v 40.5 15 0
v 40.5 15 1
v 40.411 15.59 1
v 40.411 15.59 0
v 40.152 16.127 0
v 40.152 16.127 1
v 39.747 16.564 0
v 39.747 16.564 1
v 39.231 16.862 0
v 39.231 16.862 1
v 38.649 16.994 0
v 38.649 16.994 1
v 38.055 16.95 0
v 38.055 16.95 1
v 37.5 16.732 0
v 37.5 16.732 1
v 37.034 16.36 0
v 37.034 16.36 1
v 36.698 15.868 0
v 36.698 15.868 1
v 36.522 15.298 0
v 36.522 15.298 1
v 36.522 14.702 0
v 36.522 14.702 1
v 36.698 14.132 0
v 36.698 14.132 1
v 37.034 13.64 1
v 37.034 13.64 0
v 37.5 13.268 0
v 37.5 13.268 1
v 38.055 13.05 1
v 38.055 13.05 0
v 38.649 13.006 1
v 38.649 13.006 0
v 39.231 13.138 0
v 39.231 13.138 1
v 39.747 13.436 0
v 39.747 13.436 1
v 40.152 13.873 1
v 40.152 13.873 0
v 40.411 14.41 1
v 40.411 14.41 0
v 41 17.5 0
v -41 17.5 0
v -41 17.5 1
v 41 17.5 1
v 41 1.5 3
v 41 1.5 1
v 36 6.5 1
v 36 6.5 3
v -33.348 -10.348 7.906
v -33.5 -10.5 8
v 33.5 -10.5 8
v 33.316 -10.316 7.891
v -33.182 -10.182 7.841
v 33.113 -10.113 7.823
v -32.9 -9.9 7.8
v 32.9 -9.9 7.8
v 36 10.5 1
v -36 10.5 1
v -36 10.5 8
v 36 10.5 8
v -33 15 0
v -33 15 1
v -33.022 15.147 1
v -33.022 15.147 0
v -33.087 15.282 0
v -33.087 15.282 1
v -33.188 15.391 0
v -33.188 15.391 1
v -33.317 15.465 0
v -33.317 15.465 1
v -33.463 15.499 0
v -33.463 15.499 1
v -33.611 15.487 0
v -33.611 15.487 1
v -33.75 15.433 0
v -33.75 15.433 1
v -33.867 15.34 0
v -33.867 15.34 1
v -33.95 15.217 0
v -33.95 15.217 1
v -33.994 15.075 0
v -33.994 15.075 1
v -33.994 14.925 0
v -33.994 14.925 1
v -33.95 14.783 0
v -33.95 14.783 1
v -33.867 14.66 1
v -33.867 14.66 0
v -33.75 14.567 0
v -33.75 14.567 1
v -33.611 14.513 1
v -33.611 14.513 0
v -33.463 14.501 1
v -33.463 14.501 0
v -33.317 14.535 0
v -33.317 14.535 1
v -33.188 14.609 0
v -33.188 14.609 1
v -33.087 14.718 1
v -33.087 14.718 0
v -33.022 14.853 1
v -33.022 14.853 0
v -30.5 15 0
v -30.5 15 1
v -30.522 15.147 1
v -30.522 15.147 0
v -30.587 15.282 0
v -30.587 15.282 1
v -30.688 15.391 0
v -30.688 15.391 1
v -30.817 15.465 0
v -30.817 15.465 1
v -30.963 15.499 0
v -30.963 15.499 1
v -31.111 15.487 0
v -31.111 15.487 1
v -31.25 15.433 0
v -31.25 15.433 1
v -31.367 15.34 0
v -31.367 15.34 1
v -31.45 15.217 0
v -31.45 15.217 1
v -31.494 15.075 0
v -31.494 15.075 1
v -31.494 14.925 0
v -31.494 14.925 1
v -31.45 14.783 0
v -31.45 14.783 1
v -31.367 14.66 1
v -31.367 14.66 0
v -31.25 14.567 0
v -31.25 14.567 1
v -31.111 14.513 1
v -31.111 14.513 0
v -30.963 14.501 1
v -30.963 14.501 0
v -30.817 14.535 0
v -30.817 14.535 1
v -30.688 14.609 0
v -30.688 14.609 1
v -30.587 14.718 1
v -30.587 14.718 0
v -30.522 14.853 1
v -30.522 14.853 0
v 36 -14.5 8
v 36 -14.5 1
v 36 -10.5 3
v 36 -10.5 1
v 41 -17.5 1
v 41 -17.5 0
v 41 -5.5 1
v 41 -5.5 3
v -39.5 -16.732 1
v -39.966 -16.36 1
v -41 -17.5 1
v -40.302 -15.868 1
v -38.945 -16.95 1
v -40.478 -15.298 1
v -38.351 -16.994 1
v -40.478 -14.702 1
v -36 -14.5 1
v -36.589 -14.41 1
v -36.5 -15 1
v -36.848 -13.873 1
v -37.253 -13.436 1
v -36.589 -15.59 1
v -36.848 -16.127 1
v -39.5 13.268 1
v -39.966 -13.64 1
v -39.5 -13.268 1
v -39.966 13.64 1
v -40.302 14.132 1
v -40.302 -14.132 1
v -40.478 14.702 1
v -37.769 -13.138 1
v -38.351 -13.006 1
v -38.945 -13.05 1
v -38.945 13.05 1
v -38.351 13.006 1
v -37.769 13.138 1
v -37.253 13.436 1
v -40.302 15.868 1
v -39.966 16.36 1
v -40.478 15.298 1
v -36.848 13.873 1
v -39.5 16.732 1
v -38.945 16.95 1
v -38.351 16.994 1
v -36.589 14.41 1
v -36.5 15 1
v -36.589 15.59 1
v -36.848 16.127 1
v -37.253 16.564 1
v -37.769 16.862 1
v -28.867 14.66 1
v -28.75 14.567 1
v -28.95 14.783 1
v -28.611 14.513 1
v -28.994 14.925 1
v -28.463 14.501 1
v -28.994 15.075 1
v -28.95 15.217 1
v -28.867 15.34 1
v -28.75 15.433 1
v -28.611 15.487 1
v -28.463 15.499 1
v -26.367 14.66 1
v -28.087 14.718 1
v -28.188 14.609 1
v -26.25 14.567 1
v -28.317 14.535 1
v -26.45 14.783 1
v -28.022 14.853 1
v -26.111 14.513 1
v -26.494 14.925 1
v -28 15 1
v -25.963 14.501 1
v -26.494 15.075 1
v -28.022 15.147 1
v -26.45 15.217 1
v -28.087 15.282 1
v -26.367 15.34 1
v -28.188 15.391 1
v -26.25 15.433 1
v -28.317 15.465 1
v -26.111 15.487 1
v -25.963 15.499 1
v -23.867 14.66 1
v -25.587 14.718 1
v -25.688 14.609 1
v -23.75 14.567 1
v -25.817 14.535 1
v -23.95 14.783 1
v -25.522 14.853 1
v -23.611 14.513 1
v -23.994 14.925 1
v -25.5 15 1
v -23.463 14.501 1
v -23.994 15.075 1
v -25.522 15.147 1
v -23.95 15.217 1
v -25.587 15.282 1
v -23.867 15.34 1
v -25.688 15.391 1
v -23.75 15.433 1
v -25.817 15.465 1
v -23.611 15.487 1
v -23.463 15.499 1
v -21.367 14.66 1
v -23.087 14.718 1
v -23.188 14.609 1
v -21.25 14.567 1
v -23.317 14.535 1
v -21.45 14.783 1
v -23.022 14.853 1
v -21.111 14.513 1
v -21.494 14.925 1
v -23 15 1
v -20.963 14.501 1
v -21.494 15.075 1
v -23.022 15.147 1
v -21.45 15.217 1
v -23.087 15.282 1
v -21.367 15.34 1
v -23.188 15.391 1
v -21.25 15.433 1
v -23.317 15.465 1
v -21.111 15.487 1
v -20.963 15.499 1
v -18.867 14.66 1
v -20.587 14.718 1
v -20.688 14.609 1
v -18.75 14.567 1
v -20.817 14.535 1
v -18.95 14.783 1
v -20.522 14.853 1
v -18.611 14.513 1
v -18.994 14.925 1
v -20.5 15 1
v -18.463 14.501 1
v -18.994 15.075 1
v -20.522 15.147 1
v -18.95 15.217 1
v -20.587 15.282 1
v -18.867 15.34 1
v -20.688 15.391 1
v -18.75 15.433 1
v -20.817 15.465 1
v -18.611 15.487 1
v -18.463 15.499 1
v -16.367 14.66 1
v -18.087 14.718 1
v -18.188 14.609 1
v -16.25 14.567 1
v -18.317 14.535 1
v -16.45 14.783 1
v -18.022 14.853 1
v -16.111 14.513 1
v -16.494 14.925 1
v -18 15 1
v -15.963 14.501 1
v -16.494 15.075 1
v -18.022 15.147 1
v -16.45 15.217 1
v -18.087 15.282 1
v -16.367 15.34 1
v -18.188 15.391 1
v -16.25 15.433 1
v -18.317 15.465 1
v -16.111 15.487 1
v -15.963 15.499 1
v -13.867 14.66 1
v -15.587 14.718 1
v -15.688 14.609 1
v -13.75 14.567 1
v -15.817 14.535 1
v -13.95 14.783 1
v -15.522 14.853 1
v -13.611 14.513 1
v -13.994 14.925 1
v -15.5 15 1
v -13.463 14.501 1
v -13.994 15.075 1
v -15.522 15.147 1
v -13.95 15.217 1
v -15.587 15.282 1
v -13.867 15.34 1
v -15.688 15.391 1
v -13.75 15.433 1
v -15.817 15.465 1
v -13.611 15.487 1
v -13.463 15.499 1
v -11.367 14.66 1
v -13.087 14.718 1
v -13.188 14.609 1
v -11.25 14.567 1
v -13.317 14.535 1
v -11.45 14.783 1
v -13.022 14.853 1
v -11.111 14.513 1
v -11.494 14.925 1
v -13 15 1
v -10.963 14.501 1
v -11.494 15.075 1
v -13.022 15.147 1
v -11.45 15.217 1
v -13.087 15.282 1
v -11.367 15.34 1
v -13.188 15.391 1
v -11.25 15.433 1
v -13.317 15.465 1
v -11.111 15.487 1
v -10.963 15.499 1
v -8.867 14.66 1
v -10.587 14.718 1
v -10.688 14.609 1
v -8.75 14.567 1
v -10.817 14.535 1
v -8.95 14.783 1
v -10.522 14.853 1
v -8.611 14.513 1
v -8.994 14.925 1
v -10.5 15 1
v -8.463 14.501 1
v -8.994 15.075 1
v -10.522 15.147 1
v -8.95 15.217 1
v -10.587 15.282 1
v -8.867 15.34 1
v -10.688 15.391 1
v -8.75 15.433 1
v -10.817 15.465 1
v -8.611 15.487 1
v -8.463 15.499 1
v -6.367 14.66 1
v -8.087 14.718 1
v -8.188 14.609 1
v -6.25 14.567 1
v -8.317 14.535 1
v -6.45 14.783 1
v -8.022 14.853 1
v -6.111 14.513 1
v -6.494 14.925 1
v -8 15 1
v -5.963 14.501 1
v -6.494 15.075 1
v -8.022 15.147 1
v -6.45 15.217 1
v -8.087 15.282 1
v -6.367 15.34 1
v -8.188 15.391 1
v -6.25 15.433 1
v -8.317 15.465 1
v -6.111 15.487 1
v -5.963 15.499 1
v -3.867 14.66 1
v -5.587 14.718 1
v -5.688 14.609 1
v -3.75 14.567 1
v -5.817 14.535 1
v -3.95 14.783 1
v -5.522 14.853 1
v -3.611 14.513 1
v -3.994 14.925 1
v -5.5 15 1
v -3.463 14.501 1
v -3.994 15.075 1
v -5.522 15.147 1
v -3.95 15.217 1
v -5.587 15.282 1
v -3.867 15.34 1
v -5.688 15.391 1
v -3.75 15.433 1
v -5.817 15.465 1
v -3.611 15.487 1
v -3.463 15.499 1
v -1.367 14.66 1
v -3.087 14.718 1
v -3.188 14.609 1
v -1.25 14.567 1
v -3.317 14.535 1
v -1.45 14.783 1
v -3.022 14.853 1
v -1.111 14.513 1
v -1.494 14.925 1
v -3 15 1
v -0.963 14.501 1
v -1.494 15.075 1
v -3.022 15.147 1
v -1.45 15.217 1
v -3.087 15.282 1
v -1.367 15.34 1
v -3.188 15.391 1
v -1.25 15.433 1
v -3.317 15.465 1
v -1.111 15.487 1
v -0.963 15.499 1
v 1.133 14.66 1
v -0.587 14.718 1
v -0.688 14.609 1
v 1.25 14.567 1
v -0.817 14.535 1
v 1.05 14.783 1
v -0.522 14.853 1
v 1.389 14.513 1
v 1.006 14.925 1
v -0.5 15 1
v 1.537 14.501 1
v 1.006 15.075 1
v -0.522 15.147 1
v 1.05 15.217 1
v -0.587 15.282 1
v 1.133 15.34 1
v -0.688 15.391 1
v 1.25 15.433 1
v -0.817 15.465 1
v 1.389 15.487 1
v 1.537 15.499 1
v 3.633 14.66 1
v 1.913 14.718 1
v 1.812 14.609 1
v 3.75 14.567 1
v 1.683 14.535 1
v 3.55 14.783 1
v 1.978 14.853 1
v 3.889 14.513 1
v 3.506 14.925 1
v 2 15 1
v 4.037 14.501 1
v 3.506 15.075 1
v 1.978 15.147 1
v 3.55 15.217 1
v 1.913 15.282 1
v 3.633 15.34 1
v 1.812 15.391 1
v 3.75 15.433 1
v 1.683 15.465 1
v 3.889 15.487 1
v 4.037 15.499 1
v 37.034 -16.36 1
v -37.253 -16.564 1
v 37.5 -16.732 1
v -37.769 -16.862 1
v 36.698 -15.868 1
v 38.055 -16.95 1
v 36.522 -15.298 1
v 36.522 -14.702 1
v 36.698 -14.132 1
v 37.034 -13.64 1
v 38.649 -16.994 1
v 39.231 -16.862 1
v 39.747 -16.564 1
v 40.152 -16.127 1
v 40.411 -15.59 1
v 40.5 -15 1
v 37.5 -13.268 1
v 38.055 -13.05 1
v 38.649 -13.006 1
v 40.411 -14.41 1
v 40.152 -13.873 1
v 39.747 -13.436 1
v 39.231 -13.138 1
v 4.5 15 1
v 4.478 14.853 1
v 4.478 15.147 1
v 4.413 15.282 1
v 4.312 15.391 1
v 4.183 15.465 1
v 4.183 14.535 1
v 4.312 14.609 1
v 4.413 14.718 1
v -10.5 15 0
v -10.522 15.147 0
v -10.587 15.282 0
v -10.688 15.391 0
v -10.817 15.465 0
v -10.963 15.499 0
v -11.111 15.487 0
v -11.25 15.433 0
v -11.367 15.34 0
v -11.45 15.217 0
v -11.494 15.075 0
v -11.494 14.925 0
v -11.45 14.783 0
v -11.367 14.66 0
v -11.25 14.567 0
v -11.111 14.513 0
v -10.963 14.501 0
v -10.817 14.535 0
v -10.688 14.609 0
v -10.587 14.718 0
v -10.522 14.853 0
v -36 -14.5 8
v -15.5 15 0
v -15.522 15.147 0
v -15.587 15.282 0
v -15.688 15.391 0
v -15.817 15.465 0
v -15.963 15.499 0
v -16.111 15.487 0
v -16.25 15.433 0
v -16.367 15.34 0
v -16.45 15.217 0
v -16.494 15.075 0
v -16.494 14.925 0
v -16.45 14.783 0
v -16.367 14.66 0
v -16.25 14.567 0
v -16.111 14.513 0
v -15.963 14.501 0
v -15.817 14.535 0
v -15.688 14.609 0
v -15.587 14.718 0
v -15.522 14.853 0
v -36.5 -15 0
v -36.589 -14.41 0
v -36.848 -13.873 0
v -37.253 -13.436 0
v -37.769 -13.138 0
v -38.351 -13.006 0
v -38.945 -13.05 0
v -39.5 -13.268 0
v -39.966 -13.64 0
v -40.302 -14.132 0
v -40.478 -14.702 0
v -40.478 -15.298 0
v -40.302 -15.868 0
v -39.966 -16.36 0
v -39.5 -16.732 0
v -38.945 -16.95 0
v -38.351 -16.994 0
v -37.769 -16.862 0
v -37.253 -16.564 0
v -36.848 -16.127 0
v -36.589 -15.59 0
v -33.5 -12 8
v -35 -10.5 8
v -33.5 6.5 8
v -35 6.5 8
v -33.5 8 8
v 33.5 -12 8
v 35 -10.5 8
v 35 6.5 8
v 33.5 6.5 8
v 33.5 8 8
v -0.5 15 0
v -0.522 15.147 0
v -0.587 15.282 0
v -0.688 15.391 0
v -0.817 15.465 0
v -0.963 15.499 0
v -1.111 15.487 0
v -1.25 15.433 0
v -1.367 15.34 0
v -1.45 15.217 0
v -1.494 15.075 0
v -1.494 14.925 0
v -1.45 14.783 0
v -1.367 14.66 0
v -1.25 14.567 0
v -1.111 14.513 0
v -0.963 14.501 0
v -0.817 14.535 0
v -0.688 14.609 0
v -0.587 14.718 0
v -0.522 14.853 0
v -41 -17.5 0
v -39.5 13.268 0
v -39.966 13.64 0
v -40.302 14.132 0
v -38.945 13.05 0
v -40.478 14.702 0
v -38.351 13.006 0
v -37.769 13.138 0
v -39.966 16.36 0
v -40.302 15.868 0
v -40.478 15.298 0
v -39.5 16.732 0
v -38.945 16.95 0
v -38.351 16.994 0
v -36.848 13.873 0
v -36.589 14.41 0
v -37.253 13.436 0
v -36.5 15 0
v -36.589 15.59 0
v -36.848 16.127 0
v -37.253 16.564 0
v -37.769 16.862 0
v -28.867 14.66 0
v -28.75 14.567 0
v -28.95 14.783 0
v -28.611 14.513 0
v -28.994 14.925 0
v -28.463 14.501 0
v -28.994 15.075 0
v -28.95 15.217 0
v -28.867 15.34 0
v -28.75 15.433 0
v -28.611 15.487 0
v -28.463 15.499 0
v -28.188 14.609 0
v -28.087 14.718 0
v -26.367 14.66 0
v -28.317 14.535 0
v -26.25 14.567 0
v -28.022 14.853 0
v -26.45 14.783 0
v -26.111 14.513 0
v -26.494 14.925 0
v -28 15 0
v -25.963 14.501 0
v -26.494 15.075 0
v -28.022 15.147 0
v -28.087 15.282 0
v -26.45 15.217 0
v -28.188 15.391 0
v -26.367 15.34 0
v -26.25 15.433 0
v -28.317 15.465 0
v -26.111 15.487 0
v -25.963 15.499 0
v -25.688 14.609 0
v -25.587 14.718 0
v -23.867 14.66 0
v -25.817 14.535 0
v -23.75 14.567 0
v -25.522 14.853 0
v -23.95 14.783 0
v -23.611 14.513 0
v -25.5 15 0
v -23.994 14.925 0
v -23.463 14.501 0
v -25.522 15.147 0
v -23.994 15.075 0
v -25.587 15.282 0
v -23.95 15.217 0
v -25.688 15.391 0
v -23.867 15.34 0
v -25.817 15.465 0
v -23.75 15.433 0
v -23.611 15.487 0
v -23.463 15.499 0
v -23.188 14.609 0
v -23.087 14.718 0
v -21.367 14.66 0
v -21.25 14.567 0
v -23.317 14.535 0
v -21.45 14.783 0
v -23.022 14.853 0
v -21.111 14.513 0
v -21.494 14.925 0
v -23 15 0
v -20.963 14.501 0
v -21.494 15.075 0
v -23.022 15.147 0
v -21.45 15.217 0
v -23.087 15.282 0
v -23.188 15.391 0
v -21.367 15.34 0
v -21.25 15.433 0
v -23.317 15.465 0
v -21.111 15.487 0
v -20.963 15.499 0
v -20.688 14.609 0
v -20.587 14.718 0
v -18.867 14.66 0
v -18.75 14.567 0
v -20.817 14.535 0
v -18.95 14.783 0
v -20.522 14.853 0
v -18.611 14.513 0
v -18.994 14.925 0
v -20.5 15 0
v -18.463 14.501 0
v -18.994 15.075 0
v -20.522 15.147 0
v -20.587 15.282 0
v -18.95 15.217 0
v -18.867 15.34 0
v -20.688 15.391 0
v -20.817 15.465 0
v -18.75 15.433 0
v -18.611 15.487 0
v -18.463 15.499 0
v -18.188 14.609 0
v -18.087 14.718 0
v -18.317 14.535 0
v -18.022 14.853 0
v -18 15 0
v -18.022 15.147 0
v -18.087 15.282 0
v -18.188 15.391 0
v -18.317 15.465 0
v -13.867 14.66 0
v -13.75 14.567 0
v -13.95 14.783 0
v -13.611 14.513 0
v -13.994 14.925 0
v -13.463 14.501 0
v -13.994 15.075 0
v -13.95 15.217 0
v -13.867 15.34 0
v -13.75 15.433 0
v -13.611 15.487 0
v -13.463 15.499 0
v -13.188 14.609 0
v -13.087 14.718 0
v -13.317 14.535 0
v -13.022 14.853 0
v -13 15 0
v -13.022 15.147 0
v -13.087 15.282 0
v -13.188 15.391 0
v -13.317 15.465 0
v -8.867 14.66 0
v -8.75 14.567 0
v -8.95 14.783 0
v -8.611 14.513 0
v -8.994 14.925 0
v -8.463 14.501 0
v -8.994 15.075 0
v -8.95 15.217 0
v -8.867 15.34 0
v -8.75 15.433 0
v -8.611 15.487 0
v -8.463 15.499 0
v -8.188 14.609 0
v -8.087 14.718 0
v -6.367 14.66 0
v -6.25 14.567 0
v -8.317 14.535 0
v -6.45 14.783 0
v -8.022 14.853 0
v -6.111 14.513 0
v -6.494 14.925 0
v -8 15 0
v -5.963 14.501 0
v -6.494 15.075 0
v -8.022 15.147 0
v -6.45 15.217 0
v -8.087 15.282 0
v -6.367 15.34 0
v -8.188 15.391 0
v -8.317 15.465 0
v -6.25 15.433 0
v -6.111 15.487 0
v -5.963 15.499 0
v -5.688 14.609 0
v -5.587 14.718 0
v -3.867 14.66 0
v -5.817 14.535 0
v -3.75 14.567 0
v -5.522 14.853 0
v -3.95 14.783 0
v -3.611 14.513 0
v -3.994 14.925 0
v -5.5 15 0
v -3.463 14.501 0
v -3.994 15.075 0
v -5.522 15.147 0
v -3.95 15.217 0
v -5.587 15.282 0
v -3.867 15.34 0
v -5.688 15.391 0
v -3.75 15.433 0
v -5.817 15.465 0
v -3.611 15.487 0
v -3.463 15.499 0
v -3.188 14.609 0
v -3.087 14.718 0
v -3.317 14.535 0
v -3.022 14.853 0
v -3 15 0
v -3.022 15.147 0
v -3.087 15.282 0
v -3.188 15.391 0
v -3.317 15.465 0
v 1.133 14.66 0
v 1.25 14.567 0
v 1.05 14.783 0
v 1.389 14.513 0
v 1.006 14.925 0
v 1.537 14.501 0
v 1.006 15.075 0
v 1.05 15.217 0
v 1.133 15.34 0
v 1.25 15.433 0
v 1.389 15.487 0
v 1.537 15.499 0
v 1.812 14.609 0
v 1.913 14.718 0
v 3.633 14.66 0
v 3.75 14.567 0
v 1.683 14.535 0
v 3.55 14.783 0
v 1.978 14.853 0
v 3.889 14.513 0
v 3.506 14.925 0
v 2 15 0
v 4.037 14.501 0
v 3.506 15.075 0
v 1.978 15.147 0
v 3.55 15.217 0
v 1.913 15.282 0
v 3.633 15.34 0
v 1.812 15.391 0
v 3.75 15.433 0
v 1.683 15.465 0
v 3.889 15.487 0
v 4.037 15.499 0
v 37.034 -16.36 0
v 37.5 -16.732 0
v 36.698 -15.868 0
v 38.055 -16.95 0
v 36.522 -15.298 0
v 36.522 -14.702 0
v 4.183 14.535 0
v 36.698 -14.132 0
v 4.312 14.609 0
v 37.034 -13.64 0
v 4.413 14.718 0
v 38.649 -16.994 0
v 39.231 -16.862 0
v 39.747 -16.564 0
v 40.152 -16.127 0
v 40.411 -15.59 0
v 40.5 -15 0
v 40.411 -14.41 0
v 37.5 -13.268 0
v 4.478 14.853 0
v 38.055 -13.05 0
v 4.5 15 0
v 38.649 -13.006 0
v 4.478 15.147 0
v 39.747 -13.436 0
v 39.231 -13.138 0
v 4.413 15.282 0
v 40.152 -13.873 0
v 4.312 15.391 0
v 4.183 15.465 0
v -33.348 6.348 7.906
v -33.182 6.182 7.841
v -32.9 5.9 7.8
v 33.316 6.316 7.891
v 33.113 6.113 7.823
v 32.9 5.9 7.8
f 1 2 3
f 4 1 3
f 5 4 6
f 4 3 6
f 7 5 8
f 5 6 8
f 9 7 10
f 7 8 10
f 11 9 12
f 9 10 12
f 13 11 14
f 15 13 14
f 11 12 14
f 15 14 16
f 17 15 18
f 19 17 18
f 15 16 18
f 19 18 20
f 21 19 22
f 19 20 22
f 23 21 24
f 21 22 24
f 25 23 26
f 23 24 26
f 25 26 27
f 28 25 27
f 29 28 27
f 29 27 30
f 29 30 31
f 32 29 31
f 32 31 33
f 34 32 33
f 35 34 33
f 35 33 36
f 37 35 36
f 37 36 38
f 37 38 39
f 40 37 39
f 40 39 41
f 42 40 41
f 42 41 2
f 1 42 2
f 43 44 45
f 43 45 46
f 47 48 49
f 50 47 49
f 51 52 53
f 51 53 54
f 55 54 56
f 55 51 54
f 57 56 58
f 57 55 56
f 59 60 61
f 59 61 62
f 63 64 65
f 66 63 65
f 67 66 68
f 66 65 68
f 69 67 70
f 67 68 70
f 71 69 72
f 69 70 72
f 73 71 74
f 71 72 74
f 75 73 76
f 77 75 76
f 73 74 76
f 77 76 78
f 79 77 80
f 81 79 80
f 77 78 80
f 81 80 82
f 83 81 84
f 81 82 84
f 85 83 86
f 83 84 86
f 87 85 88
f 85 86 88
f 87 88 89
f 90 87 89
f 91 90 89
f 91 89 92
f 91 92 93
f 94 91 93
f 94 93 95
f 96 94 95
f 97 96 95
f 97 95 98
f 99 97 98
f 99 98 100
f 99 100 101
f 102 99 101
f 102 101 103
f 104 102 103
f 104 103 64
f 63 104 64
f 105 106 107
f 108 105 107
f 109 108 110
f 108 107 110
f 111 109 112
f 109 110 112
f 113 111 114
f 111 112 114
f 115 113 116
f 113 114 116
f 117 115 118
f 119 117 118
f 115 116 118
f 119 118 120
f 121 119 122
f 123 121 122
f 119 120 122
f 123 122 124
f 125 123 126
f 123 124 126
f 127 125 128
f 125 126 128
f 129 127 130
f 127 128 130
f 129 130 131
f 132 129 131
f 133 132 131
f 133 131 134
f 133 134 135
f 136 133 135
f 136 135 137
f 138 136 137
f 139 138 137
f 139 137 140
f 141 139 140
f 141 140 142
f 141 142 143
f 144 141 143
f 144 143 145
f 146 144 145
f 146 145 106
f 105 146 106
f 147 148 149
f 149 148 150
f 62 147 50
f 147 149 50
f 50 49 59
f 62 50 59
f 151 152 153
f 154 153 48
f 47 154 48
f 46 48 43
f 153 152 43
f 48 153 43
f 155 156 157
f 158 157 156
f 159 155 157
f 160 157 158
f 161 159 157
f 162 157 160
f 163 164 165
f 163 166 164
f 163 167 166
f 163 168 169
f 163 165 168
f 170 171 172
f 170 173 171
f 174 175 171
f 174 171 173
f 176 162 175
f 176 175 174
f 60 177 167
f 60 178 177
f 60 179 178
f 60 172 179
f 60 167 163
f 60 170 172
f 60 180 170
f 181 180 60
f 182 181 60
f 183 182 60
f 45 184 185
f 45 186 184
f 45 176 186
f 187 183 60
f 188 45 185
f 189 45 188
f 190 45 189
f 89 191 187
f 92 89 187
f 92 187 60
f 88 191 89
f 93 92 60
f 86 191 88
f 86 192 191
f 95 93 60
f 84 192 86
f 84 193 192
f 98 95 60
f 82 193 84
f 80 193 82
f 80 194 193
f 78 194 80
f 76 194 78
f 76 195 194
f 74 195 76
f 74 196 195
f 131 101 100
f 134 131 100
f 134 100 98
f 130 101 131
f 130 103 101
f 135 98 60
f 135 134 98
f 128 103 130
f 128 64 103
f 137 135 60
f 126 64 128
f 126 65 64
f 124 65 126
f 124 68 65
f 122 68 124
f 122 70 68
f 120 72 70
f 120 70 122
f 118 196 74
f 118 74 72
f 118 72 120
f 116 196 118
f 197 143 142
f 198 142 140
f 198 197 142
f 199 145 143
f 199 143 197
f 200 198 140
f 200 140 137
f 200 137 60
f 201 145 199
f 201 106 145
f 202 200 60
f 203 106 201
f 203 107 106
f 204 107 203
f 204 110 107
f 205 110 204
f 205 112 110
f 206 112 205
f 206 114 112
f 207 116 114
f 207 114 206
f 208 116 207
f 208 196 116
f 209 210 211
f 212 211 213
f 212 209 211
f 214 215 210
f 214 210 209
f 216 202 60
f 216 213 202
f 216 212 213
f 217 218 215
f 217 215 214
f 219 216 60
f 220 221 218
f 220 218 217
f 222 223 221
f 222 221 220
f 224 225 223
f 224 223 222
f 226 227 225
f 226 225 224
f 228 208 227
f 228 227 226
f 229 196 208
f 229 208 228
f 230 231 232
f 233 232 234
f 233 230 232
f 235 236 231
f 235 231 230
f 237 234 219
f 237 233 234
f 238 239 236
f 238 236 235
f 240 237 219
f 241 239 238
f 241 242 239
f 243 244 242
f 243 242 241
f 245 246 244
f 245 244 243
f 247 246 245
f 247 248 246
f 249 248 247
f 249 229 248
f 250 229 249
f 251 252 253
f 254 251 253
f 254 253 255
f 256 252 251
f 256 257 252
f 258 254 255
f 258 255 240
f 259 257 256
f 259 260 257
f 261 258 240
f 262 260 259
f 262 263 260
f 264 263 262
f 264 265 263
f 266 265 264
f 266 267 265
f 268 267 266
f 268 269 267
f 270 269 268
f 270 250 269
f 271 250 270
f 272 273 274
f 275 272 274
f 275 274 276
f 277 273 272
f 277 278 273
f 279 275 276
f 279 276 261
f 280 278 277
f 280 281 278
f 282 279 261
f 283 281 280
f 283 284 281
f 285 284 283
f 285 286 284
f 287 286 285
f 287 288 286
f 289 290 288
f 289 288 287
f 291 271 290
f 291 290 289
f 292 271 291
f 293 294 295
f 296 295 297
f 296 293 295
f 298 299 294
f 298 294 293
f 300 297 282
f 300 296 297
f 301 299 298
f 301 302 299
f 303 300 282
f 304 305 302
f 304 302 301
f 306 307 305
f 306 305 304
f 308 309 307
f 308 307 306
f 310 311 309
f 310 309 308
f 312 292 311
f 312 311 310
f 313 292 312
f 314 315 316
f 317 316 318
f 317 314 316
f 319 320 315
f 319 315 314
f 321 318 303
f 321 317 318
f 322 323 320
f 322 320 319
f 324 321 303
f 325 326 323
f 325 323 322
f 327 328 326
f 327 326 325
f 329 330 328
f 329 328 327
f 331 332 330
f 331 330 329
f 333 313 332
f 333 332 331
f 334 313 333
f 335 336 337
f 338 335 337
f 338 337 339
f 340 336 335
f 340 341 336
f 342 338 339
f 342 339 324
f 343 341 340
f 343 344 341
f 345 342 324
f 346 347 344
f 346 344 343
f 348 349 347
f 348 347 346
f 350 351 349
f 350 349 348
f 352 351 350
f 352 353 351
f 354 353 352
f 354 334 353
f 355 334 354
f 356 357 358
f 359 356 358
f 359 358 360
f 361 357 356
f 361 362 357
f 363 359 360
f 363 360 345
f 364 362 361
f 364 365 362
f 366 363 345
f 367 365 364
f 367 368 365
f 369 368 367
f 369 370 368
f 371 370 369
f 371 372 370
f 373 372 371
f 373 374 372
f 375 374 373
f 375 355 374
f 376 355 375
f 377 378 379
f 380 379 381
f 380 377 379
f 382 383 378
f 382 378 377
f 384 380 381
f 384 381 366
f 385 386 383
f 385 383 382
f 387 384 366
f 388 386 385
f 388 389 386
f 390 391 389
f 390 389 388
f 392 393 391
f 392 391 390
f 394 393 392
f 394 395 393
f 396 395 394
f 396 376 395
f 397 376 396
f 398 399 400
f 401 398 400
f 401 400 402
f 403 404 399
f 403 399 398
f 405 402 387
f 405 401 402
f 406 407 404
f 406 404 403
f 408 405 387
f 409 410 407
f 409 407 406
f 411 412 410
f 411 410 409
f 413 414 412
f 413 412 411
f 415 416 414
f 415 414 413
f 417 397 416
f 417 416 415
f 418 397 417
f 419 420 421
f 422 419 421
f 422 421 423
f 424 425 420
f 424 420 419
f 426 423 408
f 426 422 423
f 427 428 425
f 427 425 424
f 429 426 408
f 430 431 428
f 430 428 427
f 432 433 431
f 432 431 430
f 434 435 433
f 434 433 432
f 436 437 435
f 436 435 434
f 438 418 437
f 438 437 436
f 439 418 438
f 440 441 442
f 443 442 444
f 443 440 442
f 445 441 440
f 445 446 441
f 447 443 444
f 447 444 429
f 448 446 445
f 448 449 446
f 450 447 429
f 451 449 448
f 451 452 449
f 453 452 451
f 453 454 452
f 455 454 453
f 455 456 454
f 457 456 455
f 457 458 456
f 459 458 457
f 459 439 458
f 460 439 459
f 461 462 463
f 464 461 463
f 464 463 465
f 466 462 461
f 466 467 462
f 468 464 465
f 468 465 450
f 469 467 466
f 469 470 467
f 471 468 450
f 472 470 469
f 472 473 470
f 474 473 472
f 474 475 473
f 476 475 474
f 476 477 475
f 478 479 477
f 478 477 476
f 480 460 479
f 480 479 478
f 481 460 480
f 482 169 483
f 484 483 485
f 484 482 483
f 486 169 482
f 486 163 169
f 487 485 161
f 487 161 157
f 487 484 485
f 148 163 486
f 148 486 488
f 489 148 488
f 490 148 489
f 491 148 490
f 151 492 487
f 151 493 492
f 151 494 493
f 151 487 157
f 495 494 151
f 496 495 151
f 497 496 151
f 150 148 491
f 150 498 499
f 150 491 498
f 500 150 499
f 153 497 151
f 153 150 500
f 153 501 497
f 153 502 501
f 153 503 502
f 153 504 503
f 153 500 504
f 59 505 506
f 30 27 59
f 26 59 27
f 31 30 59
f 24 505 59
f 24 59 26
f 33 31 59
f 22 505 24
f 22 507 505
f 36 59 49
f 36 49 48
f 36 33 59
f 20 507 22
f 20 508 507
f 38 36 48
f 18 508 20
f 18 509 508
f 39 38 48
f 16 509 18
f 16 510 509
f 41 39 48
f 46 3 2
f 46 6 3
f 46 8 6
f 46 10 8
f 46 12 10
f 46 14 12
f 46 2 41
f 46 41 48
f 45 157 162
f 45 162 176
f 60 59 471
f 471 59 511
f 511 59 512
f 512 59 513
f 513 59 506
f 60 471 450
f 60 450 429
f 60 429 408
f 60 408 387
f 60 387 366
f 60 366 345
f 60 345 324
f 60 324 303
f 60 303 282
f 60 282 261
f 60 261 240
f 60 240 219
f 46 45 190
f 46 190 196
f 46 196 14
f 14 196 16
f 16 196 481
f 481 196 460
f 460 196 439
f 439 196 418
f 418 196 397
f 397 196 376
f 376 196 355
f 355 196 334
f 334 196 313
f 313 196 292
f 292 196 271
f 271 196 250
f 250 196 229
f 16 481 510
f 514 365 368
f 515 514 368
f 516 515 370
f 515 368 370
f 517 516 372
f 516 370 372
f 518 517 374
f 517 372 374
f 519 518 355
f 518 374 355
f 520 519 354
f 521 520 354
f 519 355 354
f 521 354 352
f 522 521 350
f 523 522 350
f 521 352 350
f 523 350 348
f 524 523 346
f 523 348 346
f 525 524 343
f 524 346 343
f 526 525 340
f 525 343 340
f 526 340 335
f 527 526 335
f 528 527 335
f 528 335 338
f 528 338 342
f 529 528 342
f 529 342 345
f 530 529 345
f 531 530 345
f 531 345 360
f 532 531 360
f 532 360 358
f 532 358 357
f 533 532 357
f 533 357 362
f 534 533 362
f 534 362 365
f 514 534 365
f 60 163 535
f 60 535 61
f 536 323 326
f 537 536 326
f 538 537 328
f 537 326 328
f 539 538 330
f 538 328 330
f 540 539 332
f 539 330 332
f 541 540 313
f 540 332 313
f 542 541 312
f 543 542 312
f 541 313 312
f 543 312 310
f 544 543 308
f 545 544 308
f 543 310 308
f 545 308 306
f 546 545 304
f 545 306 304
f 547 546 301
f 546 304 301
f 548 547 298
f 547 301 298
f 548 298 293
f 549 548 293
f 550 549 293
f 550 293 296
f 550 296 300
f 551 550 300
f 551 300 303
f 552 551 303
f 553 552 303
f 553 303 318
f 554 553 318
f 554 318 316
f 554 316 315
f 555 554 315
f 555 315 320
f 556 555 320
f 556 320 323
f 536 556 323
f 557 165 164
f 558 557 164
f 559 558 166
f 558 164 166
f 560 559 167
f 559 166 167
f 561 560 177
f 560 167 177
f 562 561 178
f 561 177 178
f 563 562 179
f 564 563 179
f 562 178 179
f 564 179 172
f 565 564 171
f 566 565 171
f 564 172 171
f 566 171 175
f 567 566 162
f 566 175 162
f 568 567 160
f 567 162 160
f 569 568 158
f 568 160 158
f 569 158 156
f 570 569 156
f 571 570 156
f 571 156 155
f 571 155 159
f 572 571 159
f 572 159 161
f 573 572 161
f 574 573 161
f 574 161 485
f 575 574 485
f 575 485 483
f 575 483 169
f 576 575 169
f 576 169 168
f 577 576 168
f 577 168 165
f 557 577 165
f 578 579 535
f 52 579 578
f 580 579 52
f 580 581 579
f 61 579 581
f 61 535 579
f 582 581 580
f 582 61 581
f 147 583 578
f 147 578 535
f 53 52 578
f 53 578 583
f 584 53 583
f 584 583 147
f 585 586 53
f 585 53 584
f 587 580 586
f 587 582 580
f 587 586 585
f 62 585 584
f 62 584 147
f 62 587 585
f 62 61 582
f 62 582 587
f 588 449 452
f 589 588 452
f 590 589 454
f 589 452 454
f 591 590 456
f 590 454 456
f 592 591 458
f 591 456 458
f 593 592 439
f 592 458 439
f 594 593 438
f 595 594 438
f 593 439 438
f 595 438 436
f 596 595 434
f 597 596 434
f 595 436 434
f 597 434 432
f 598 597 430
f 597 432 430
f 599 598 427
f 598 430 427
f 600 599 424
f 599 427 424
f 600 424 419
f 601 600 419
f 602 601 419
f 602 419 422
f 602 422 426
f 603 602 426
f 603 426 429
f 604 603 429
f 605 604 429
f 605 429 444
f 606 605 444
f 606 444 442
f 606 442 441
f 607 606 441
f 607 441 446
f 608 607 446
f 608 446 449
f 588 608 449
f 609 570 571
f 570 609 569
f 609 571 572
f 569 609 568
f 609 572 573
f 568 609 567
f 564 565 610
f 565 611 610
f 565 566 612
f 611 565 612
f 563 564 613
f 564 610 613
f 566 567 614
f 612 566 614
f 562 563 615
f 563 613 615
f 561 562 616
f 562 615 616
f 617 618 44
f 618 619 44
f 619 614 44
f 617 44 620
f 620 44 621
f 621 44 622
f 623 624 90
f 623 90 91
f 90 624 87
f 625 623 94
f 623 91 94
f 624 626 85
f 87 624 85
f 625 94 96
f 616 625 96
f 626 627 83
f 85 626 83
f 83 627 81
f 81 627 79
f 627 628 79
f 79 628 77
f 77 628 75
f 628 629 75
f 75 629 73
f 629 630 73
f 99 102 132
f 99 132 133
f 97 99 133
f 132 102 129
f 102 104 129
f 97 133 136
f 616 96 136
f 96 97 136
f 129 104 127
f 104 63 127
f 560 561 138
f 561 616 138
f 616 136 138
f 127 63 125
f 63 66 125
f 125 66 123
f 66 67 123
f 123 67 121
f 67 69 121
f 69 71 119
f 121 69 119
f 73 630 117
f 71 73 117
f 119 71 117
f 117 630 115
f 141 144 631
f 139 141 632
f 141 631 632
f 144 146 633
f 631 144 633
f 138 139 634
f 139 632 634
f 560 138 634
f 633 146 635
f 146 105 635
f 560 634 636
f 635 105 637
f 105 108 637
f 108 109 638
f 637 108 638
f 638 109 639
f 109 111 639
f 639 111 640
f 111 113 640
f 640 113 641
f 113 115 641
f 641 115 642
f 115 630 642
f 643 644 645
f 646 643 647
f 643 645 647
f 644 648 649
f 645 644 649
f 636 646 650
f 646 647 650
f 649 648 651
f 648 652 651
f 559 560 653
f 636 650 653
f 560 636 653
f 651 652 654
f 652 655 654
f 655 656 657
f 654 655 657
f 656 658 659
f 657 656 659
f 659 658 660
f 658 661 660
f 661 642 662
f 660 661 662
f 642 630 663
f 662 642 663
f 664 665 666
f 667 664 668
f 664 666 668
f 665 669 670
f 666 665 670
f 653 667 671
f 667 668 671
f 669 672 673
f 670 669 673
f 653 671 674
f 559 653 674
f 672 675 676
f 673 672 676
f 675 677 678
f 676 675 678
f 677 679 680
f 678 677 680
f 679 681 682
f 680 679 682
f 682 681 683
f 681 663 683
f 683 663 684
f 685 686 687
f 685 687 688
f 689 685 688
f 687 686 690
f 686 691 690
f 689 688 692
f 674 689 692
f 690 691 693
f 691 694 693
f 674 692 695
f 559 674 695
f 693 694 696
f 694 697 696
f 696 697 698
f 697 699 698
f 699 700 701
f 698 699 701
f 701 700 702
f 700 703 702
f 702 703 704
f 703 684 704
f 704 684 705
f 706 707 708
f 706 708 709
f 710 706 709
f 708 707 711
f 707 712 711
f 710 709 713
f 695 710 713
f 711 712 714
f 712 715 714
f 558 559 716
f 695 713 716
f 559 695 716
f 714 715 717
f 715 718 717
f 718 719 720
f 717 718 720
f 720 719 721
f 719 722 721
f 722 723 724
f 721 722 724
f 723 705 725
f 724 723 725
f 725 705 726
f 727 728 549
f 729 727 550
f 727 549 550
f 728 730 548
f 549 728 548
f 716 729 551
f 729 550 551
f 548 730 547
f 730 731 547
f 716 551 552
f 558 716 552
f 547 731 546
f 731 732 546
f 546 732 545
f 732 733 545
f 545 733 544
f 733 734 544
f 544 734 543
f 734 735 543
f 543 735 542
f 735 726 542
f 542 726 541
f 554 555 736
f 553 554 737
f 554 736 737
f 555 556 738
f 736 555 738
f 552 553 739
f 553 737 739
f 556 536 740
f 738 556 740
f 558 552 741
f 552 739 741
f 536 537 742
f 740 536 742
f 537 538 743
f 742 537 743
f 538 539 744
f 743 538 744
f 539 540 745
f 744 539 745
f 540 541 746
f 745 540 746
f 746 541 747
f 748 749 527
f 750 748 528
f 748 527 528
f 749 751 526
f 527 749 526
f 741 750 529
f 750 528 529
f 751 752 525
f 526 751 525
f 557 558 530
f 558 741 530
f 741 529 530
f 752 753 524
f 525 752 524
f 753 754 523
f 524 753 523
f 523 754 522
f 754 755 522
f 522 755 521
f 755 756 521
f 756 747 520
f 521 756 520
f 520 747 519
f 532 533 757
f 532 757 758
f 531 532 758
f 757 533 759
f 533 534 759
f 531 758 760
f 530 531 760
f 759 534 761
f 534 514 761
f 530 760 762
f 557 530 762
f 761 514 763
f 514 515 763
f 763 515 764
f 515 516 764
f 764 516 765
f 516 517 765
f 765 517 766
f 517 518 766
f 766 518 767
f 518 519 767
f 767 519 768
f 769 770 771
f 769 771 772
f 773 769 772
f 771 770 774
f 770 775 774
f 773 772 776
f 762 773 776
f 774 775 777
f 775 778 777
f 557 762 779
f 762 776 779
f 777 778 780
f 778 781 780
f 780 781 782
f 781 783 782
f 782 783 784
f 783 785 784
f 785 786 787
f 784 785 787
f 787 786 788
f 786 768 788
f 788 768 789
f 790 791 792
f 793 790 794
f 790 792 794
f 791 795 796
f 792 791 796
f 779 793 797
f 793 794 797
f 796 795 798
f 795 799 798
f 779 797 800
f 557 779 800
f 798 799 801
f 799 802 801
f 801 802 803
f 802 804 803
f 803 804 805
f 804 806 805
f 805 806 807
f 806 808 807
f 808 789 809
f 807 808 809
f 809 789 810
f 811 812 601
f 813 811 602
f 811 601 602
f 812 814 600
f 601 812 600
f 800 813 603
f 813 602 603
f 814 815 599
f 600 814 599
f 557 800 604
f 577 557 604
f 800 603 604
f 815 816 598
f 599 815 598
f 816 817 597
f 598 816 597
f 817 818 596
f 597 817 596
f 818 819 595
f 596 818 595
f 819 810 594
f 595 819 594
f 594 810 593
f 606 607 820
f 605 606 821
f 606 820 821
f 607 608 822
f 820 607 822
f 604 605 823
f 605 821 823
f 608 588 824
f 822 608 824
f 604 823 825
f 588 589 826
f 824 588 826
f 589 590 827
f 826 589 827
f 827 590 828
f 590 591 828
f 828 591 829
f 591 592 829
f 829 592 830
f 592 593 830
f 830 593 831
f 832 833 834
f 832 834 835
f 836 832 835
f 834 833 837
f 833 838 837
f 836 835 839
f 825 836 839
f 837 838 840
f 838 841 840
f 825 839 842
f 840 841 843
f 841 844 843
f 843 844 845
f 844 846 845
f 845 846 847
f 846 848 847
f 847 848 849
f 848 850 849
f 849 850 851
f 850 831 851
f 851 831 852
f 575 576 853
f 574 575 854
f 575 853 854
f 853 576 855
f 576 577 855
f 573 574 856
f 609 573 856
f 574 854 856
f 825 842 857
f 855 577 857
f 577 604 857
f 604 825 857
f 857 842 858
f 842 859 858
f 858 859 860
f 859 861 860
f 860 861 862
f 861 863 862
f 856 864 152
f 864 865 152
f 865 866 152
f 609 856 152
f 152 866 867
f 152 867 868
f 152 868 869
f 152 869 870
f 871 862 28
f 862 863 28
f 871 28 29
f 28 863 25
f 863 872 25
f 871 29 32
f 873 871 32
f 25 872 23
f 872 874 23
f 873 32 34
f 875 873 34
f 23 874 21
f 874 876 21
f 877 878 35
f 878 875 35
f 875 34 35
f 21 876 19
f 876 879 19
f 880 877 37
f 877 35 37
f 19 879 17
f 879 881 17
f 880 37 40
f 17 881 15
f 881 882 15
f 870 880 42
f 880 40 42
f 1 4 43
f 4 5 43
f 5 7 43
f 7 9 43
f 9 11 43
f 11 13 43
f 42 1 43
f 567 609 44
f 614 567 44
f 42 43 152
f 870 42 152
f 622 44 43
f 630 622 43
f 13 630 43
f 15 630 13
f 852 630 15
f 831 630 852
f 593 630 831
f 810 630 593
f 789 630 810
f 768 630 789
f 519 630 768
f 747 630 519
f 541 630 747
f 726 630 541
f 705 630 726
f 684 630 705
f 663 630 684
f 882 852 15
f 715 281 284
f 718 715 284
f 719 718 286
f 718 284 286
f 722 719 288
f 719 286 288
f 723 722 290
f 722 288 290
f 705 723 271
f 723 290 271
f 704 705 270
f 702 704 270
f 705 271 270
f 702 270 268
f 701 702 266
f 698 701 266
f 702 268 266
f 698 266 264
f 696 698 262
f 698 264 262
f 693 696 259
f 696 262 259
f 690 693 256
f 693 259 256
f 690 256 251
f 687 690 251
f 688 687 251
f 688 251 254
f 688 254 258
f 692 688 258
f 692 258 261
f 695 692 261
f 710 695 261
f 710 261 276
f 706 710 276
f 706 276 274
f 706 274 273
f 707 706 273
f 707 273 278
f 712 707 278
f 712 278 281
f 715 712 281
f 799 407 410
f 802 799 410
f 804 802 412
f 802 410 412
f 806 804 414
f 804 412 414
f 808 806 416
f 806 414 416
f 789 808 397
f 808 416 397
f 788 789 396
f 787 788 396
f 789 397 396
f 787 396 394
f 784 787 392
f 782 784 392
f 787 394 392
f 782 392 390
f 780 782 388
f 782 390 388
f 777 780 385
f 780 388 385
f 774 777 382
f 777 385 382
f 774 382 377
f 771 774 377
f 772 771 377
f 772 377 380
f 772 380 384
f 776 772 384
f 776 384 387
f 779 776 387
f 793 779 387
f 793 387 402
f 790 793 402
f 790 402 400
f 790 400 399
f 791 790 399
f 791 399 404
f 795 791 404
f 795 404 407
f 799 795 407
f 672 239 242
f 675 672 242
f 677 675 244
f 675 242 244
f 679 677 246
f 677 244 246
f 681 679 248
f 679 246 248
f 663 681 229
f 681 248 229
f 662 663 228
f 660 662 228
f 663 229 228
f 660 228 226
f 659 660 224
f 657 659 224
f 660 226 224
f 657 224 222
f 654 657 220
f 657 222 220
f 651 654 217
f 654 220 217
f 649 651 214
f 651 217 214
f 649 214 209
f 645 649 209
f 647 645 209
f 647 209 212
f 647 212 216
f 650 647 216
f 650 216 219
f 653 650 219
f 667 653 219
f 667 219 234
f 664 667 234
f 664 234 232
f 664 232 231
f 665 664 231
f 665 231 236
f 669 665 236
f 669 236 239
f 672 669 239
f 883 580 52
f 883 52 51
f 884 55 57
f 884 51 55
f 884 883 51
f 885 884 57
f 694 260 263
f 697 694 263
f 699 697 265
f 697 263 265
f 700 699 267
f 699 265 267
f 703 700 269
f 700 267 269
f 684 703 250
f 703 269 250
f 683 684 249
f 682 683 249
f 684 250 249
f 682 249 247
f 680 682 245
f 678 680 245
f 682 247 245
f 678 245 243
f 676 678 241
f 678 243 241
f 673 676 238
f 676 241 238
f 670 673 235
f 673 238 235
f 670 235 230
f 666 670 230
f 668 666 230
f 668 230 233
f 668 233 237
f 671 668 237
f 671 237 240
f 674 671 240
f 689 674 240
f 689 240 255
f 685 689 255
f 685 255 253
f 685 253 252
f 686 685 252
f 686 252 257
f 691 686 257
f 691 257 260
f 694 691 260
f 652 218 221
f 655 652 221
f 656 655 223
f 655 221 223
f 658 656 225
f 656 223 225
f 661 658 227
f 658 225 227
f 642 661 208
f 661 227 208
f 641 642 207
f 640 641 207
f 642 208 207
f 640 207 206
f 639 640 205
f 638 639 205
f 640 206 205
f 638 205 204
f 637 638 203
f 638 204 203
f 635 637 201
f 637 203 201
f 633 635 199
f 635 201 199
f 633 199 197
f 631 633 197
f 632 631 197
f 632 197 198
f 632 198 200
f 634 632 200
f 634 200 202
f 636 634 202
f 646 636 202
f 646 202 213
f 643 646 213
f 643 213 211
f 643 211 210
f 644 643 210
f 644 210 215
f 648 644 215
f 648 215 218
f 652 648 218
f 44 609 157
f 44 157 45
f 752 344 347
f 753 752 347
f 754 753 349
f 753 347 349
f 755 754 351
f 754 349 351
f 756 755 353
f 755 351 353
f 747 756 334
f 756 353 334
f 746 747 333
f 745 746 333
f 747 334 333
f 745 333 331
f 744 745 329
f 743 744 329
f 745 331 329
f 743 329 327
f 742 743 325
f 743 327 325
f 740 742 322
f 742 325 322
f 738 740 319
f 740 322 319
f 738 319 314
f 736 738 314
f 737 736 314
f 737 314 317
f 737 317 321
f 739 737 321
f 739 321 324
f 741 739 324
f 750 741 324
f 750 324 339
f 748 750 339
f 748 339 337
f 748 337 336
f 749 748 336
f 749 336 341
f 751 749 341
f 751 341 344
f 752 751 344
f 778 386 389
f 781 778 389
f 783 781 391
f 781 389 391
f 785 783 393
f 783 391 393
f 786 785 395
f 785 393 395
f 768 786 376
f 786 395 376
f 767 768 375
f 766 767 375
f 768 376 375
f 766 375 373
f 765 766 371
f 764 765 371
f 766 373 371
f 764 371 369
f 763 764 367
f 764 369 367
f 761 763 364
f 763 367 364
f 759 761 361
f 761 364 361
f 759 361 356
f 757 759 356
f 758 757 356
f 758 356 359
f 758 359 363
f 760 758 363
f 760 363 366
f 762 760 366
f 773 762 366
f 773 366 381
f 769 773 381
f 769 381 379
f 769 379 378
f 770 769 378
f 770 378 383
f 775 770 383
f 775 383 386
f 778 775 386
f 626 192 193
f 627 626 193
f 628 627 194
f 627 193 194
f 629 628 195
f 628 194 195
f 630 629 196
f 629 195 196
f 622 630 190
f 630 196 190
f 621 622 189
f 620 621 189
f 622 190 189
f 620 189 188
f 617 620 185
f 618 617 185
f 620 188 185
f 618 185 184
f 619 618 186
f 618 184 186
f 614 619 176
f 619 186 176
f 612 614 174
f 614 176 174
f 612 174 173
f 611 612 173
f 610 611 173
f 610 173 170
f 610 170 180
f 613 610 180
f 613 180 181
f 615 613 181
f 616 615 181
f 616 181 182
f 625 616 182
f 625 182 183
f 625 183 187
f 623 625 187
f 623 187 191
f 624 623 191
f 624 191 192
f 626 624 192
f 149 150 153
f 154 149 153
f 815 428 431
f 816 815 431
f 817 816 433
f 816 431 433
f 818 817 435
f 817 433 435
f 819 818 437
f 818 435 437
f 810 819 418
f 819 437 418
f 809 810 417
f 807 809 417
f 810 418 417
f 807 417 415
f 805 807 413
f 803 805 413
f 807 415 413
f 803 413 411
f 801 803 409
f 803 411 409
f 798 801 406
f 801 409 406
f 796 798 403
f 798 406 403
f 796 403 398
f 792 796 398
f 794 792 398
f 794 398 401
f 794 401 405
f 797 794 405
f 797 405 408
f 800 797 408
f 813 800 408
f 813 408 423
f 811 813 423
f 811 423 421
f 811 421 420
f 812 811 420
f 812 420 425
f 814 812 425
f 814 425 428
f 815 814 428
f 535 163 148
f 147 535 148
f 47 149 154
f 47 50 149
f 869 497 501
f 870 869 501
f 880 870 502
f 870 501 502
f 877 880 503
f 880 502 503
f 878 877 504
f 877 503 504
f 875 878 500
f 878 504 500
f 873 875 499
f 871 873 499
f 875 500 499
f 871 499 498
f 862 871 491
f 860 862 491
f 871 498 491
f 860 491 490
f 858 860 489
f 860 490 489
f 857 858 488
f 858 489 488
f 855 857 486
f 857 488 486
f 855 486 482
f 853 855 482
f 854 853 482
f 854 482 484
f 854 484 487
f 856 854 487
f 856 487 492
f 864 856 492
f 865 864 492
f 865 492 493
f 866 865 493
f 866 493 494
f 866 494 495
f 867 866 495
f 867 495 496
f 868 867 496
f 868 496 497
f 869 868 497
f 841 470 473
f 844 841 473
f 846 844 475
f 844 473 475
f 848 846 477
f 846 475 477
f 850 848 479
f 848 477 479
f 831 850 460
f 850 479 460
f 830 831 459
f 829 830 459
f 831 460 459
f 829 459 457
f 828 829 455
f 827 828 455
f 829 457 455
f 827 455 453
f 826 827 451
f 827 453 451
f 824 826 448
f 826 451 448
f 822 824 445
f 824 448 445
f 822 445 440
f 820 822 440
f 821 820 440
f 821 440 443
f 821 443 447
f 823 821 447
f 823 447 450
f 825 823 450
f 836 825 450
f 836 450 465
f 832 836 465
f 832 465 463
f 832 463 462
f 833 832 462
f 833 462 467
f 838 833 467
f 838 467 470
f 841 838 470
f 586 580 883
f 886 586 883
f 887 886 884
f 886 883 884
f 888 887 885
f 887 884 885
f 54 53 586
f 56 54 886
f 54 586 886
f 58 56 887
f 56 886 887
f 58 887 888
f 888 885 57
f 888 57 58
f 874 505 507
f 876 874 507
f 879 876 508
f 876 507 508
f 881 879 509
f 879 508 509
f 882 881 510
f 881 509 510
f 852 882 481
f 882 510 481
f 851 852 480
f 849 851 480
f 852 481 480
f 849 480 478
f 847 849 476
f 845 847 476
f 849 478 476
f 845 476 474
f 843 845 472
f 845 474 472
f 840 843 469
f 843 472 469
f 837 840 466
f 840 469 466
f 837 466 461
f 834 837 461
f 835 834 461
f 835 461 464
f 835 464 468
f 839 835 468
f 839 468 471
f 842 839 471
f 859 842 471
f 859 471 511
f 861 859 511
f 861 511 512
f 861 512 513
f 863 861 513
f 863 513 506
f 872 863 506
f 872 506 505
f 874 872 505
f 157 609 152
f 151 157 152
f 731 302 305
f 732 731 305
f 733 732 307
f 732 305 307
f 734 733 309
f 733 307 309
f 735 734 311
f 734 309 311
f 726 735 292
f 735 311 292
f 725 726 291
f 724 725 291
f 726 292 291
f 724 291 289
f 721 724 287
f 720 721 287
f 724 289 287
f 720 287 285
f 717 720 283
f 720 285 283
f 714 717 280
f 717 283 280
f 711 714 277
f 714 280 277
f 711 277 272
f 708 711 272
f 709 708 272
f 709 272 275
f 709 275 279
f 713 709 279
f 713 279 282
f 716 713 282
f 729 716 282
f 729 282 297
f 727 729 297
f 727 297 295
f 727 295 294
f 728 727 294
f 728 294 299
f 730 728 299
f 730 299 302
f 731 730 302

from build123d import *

# Parameters (mm, degrees)
F0_W         = 82
F0_H         = 35
F1_DEPTH     = 1
F2_W         = 72
F2_H         = 25
F3_DEPTH     = 7
F5_DEPTH     = 2
F6_R         = 2
F7_DEPTH     = 2
F8_W         = 67
F8_H         = 17
F9_DEPTH     = 0.2
F10_T1_DEPTH = 20
F10_T3_DEPTH = 70
F11_R        = 0.5
F12_DEPTH    = 2


# Not quite as in the source:
# - a fillet or chamfer that OpenCascade refuses, or shapes differently, is made with other operations: its cross-section is extruded or revolved along the edge and cut away or added


with BuildPart() as f1:
    # F0 (on Top) → F1 (new body)
    with BuildSketch(Plane.XY):
        Rectangle(F0_W, F0_H)
    extrude(amount=F1_DEPTH)

    # F2 (on face) → F3 (join)
    with BuildSketch(Plane.XY.offset(1)):
        with Locations((0, -2)):
            Rectangle(F2_W, F2_H)
    extrude(amount=F3_DEPTH)

    # F4 (on face) → F5 (join)
    with BuildSketch(Plane.XY.offset(1)):
        Polygon((36, -10.5), (41, -5.5), (41, 1.5), (36, 6.5), align=None)
    extrude(amount=F5_DEPTH)

    # F6 (on face) → F7 (cut)
    with BuildSketch(Plane.XY.offset(1)):
        with Locations((-38.5, -15)):
            Circle(F6_R)
        with Locations((38.5, -15)):
            Circle(F6_R)
        with Locations((-38.5, 15)):
            Circle(F6_R)
        with Locations((38.5, 15)):
            Circle(F6_R)
    extrude(amount=-F7_DEPTH, mode=Mode.SUBTRACT)

    # F8 (on face) → F9 (cut)
    with BuildSketch(Plane.XY.offset(8)):
        with Locations((0, -2)):
            Rectangle(F8_W, F8_H)
    extrude(amount=-F9_DEPTH, mode=Mode.SUBTRACT)

    # F10: fillet of radius 1 on 4 edges, made by hand

    # F10_s2 → F10_t1 (join)
    with BuildSketch(Plane.XZ.offset(-8)):
        with BuildLine():
            ThreePointArc((33.5, 8), (33.216227766, 7.8513167019), (32.9, 7.8))
            Line((32.9, 7.8), (33.5, 7.8))
            Line((33.5, 7.8), (33.5, 8))
        make_face()
        with BuildLine():
            ThreePointArc((-33.5, 8), (-33.216227766, 7.8513167019), (-32.9, 7.8))
            Line((-32.9, 7.8), (-33.5, 7.8))
            Line((-33.5, 7.8), (-33.5, 8))
        make_face()
    extrude(amount=F10_T1_DEPTH)

    # F10_s4 → F10_t3 (join)
    with BuildSketch(Plane.YZ.offset(-35)):
        with BuildLine():
            ThreePointArc((6.5, 8), (6.216227766, 7.8513167019), (5.9, 7.8))
            Line((5.9, 7.8), (6.5, 7.8))
            Line((6.5, 7.8), (6.5, 8))
        make_face()
        with BuildLine():
            ThreePointArc((-10.5, 8), (-10.216227766, 7.8513167019), (-9.9, 7.8))
            Line((-9.9, 7.8), (-10.5, 7.8))
            Line((-10.5, 7.8), (-10.5, 8))
        make_face()
    extrude(amount=F10_T3_DEPTH)

    # F11 (on face) → F12 (cut)
    with BuildSketch(Plane.XY.offset(1)):
        with Locations((-33.5, 15)):
            Circle(F11_R)
        with Locations((-31, 15)):
            Circle(F11_R)
        with Locations((-28.5, 15)):
            Circle(F11_R)
        with Locations((-26, 15)):
            Circle(F11_R)
        with Locations((-23.5, 15)):
            Circle(F11_R)
        with Locations((-21, 15)):
            Circle(F11_R)
        with Locations((-18.5, 15)):
            Circle(F11_R)
        with Locations((-16, 15)):
            Circle(F11_R)
        with Locations((-13.5, 15)):
            Circle(F11_R)
        with Locations((-11, 15)):
            Circle(F11_R)
        with Locations((-8.5, 15)):
            Circle(F11_R)
        with Locations((-6, 15)):
            Circle(F11_R)
        with Locations((-3.5, 15)):
            Circle(F11_R)
        with Locations((-1, 15)):
            Circle(F11_R)
        with Locations((1.5, 15)):
            Circle(F11_R)
        with Locations((4, 15)):
            Circle(F11_R)
    extrude(amount=-F12_DEPTH, mode=Mode.SUBTRACT)


solid = f1.part
